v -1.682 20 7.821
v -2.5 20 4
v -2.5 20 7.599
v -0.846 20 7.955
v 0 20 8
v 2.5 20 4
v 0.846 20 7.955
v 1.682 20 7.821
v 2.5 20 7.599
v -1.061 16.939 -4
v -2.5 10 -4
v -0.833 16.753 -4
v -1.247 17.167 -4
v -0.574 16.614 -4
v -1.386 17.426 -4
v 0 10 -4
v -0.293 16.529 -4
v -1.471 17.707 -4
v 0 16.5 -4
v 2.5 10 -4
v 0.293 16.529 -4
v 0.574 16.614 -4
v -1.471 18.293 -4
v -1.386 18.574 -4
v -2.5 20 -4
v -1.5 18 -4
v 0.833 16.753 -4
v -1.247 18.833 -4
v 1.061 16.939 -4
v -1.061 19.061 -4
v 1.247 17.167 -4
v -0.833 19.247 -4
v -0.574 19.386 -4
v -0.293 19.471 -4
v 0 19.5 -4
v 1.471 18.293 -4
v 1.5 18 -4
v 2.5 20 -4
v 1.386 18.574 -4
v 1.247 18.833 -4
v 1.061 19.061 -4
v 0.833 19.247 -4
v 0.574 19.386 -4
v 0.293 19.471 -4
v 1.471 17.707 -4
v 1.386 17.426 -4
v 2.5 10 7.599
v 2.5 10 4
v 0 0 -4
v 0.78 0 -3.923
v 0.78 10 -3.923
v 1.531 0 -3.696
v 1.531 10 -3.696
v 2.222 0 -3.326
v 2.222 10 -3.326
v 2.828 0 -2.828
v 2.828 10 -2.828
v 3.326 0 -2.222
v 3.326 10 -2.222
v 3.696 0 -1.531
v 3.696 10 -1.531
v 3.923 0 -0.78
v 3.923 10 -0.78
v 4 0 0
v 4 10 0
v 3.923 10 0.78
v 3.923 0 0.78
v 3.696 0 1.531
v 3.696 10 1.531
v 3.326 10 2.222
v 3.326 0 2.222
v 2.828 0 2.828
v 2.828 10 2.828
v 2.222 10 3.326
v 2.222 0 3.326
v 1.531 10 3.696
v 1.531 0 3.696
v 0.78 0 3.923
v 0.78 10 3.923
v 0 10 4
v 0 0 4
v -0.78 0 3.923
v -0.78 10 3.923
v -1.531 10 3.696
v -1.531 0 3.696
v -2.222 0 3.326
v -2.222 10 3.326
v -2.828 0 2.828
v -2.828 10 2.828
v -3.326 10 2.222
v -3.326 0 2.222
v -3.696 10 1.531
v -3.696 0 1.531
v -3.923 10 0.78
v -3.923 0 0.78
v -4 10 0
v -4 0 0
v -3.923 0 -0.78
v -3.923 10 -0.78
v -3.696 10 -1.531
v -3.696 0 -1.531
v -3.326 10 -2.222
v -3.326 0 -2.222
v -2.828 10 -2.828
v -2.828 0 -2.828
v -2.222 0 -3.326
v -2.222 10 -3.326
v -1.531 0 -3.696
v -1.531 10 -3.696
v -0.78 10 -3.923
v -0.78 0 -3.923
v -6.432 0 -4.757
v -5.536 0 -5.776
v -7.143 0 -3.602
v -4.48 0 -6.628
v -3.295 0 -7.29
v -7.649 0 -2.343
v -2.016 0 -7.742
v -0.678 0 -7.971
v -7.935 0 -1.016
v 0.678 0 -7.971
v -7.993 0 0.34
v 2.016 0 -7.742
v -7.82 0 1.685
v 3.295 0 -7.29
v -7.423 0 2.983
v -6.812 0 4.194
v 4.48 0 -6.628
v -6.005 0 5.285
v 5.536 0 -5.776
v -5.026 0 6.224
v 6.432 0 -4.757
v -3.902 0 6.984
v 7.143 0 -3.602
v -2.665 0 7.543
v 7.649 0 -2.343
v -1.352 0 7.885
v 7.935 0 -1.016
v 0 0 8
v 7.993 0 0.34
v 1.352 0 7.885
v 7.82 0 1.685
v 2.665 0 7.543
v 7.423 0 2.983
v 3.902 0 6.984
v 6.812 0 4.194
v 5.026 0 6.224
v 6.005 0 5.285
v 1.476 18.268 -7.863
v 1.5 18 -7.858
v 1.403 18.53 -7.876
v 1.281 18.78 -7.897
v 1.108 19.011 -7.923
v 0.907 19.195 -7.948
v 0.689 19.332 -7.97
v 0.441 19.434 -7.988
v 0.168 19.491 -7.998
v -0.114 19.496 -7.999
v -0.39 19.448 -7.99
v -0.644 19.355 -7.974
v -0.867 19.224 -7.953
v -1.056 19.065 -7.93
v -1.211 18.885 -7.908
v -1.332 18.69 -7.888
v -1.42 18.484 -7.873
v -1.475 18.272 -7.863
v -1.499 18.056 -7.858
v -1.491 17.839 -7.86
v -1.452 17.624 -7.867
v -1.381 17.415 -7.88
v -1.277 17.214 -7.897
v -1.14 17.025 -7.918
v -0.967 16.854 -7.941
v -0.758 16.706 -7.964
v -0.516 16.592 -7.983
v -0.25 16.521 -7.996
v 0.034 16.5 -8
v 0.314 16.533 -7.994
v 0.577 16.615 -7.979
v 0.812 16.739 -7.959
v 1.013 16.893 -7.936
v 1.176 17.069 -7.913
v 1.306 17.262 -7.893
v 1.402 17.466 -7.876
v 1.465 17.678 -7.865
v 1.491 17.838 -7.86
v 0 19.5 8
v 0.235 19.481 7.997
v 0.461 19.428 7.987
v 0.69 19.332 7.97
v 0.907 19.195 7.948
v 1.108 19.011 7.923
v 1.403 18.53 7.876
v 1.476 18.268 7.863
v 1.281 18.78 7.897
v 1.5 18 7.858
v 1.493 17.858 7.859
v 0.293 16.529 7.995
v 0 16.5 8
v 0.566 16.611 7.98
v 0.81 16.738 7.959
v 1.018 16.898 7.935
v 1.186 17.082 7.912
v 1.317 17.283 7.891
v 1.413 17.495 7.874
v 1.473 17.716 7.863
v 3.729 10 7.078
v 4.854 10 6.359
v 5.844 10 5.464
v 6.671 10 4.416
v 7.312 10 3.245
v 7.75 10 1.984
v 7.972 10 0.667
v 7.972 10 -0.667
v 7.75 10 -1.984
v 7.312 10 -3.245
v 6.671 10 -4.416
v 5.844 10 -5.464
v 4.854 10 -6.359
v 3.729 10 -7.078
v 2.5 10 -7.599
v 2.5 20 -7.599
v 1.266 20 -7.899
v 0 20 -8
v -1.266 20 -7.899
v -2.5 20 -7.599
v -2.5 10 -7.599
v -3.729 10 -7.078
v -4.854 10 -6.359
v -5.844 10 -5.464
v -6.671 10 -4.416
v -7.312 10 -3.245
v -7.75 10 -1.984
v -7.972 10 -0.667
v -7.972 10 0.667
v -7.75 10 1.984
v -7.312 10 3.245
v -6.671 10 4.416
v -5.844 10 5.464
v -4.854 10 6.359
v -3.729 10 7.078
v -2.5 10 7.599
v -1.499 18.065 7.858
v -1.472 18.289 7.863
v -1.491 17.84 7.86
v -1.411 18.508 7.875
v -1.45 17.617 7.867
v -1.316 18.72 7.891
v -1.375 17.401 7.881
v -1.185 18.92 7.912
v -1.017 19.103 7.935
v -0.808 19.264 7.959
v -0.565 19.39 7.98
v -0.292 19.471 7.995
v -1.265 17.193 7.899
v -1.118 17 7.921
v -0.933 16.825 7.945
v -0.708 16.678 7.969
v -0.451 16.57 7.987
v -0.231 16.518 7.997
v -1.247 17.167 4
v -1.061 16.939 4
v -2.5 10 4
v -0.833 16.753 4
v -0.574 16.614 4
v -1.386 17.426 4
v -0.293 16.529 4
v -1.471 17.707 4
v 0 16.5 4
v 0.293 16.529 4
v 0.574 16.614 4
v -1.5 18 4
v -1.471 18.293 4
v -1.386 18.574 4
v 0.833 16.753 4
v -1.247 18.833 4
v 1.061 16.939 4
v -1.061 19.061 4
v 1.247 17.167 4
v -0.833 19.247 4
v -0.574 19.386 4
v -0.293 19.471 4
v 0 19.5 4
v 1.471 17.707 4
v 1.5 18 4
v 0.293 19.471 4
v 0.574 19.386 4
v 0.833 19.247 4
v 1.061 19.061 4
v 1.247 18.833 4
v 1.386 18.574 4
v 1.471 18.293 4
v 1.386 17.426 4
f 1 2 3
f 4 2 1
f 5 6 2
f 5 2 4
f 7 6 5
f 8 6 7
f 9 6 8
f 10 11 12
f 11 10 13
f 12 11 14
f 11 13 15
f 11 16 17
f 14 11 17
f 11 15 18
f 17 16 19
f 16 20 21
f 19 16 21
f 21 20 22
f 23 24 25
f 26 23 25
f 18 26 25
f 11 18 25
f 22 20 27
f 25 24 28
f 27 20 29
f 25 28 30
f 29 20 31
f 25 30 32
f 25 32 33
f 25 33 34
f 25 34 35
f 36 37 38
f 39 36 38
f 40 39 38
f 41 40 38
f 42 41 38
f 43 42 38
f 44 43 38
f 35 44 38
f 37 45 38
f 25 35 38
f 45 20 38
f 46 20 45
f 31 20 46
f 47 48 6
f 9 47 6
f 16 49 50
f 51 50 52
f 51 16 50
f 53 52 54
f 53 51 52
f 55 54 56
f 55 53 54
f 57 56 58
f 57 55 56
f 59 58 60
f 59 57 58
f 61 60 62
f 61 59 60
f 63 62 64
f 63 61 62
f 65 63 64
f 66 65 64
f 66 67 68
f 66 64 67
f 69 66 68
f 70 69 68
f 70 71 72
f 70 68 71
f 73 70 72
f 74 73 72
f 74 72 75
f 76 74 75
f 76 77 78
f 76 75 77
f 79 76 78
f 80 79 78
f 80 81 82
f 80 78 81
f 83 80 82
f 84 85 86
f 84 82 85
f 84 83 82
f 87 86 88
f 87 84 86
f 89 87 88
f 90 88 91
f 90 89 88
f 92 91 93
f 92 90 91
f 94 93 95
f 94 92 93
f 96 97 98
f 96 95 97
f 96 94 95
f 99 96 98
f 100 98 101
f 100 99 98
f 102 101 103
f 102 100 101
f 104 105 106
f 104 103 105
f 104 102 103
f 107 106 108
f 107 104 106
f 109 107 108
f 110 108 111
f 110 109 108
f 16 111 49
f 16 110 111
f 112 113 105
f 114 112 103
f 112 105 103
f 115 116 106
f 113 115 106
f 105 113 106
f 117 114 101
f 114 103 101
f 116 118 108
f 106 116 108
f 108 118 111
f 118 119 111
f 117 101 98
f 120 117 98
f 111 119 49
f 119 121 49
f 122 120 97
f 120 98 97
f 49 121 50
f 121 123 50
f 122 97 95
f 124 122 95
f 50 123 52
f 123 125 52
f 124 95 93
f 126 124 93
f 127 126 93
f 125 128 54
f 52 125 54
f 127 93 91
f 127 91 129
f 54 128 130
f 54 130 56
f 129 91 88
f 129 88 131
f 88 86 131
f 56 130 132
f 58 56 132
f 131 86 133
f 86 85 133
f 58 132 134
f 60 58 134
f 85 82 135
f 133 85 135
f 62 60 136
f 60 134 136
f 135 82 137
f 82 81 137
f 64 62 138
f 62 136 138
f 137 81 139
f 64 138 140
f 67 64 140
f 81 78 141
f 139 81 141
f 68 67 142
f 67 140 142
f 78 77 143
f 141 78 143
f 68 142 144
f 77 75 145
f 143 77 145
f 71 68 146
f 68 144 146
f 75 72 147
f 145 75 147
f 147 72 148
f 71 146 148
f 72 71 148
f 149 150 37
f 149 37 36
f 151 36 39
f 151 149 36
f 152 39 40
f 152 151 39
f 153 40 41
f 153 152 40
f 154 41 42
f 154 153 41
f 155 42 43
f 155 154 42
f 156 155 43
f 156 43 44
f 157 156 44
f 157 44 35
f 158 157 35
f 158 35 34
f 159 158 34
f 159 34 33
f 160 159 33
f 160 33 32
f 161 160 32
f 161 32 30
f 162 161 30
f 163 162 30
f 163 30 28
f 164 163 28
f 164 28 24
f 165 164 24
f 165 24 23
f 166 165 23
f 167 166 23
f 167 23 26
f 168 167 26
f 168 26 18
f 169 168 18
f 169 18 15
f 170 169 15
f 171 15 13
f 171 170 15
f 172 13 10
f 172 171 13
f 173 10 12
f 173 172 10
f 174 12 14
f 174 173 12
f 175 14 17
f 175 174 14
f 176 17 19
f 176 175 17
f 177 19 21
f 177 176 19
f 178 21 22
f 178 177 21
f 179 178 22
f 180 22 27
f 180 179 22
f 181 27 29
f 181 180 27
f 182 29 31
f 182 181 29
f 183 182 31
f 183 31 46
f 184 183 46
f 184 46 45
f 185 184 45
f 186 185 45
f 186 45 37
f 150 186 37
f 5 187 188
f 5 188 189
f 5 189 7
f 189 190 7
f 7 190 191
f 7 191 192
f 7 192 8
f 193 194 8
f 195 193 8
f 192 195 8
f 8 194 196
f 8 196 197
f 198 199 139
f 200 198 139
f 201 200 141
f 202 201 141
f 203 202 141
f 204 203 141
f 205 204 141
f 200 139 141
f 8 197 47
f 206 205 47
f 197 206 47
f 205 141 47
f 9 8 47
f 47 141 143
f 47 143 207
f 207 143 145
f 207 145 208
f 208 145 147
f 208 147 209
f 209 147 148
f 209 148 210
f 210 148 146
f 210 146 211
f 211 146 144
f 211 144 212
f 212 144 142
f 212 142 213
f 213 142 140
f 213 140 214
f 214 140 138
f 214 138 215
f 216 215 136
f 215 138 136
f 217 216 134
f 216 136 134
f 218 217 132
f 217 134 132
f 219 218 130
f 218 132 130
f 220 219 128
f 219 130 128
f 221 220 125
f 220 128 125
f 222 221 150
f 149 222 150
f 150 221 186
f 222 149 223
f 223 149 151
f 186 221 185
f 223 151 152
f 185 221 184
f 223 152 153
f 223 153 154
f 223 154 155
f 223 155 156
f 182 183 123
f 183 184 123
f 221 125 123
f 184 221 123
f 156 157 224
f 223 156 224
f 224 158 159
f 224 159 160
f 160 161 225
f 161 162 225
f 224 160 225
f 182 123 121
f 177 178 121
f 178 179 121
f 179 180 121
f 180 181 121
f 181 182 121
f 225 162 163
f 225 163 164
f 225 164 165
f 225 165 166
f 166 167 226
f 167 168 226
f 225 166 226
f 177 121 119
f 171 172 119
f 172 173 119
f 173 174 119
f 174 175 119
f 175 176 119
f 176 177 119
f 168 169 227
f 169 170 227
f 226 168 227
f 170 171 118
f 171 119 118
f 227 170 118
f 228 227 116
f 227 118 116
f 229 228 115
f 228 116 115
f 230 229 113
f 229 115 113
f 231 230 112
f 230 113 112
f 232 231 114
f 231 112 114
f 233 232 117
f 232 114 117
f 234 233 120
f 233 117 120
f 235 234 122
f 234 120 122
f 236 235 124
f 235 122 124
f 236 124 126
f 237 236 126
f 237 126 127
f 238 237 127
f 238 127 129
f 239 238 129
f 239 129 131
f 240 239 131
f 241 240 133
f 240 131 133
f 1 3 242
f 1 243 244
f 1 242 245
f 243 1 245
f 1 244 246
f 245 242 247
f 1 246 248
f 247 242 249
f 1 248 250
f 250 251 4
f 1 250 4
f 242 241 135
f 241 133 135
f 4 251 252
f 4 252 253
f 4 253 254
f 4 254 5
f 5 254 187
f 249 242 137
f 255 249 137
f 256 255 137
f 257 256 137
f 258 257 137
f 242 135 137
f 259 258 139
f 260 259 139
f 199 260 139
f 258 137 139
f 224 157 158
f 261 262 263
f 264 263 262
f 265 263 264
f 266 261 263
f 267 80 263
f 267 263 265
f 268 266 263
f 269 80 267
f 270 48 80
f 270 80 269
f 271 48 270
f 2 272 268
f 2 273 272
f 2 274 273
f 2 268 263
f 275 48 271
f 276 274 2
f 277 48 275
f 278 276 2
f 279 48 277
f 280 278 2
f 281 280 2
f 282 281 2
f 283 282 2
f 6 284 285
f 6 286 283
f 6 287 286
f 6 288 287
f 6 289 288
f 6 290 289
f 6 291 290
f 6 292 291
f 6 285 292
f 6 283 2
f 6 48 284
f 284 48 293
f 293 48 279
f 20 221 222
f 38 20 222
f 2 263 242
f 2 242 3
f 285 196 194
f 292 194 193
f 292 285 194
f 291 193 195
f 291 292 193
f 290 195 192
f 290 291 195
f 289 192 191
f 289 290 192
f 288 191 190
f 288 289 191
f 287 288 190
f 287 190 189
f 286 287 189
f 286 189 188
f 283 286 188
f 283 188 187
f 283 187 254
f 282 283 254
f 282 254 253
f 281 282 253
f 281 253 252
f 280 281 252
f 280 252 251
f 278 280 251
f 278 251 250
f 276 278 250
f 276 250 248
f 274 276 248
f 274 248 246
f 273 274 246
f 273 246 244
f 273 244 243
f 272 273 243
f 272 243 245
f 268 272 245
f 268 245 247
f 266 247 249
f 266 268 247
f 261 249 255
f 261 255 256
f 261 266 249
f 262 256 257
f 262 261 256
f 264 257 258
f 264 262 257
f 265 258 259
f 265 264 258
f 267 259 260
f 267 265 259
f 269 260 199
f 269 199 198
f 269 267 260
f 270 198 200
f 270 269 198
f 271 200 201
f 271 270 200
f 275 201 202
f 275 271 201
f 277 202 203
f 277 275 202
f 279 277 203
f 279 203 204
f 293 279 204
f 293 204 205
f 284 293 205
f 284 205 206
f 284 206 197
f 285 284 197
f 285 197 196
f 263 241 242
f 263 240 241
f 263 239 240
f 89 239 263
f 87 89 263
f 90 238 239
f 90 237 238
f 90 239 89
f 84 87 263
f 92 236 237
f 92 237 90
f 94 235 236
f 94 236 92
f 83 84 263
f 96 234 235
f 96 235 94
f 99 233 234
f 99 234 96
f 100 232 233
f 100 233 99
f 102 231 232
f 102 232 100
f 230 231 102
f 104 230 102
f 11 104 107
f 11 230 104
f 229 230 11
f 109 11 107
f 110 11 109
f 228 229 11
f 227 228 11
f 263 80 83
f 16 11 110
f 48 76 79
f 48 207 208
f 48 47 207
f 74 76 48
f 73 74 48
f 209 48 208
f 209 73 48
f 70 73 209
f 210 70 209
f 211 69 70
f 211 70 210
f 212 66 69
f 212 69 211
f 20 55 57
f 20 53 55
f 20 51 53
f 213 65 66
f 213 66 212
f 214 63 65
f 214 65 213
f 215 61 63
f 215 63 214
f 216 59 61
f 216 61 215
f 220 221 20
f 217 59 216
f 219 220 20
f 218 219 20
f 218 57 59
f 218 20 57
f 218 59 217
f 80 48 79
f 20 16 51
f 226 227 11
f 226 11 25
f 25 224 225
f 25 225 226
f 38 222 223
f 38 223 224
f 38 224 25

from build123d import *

# Parameters (mm, degrees)
SKETCH_1_R               = 8
EXTRUDE_1_DEPTH          = 20
CUT_EXTRUDE_1_DEPTH      = 23.978250586
CUT_EXTRUDE_1_DEPTH_BACK = 23.978250586
SKETCH_2_W               = 5.5
SKETCH_2_H               = 10
CUT_EXTRUDE_2_DEPTH      = 24.963513933
CUT_EXTRUDE_2_DEPTH_BACK = 24.963513933
SKETCH_3_W               = 8
SKETCH_3_H               = 10
CUT_EXTRUDE_3_DEPTH      = 23.978250586
CUT_EXTRUDE_3_DEPTH_BACK = 23.978250586
SKETCH_4_R               = 1.5
CUT_EXTRUDE_4_DEPTH      = 23.978250743
CUT_EXTRUDE_4_DEPTH_BACK = 23.978250743
SKETCH_5_R               = 4


with BuildPart() as part:
    # 草图1 → 凸台-拉伸1 (new body)
    with BuildSketch(Plane(origin=(0, 0, 0), x_dir=(1, 0, 0), z_dir=(0, 1, 0))):
        with Locations(Location((0, 0, 0), (0, 0, 270))):
            Circle(SKETCH_1_R)
    extrude(amount=EXTRUDE_1_DEPTH)

    # 草图2 → 切除-拉伸1 (cut, two sides: drawn at the far end of the back side and taken through both)
    with BuildSketch(Plane.XY.offset(-CUT_EXTRUDE_1_DEPTH_BACK)):
        with Locations((-5.25, 15)):
            Rectangle(SKETCH_2_W, SKETCH_2_H)
        with Locations((5.25, 15)):
            Rectangle(SKETCH_2_W, SKETCH_2_H)
    extrude(amount=CUT_EXTRUDE_1_DEPTH + CUT_EXTRUDE_1_DEPTH_BACK, mode=Mode.SUBTRACT)

    # 草图3 → 切除-拉伸2 (cut, two sides: drawn at the far end of the back side and taken through both)
    with BuildSketch(Plane.ZY.offset(2.5).offset(-CUT_EXTRUDE_2_DEPTH_BACK)):
        with Locations((0, 15)):
            Rectangle(SKETCH_3_W, SKETCH_3_H)
    extrude(amount=CUT_EXTRUDE_2_DEPTH + CUT_EXTRUDE_2_DEPTH_BACK, mode=Mode.SUBTRACT)

    # 草图4 → 切除-拉伸3 (cut, two sides: drawn at the far end of the back side and taken through both)
    with BuildSketch(Plane.XY.offset(-CUT_EXTRUDE_3_DEPTH_BACK)):
        with Locations((0, 18)):
            Circle(SKETCH_4_R)
    extrude(amount=CUT_EXTRUDE_3_DEPTH + CUT_EXTRUDE_3_DEPTH_BACK, mode=Mode.SUBTRACT)

    # 草图5 → 切除-拉伸4 (cut, two sides: drawn at the far end of the back side and taken through both)
    with BuildSketch(Plane.XZ.offset(-CUT_EXTRUDE_4_DEPTH_BACK)):
        with Locations(Location((0, 0, 0), (0, 0, 270))):
            Circle(SKETCH_5_R)
    extrude(amount=CUT_EXTRUDE_4_DEPTH + CUT_EXTRUDE_4_DEPTH_BACK, mode=Mode.SUBTRACT)


solid = part.part
